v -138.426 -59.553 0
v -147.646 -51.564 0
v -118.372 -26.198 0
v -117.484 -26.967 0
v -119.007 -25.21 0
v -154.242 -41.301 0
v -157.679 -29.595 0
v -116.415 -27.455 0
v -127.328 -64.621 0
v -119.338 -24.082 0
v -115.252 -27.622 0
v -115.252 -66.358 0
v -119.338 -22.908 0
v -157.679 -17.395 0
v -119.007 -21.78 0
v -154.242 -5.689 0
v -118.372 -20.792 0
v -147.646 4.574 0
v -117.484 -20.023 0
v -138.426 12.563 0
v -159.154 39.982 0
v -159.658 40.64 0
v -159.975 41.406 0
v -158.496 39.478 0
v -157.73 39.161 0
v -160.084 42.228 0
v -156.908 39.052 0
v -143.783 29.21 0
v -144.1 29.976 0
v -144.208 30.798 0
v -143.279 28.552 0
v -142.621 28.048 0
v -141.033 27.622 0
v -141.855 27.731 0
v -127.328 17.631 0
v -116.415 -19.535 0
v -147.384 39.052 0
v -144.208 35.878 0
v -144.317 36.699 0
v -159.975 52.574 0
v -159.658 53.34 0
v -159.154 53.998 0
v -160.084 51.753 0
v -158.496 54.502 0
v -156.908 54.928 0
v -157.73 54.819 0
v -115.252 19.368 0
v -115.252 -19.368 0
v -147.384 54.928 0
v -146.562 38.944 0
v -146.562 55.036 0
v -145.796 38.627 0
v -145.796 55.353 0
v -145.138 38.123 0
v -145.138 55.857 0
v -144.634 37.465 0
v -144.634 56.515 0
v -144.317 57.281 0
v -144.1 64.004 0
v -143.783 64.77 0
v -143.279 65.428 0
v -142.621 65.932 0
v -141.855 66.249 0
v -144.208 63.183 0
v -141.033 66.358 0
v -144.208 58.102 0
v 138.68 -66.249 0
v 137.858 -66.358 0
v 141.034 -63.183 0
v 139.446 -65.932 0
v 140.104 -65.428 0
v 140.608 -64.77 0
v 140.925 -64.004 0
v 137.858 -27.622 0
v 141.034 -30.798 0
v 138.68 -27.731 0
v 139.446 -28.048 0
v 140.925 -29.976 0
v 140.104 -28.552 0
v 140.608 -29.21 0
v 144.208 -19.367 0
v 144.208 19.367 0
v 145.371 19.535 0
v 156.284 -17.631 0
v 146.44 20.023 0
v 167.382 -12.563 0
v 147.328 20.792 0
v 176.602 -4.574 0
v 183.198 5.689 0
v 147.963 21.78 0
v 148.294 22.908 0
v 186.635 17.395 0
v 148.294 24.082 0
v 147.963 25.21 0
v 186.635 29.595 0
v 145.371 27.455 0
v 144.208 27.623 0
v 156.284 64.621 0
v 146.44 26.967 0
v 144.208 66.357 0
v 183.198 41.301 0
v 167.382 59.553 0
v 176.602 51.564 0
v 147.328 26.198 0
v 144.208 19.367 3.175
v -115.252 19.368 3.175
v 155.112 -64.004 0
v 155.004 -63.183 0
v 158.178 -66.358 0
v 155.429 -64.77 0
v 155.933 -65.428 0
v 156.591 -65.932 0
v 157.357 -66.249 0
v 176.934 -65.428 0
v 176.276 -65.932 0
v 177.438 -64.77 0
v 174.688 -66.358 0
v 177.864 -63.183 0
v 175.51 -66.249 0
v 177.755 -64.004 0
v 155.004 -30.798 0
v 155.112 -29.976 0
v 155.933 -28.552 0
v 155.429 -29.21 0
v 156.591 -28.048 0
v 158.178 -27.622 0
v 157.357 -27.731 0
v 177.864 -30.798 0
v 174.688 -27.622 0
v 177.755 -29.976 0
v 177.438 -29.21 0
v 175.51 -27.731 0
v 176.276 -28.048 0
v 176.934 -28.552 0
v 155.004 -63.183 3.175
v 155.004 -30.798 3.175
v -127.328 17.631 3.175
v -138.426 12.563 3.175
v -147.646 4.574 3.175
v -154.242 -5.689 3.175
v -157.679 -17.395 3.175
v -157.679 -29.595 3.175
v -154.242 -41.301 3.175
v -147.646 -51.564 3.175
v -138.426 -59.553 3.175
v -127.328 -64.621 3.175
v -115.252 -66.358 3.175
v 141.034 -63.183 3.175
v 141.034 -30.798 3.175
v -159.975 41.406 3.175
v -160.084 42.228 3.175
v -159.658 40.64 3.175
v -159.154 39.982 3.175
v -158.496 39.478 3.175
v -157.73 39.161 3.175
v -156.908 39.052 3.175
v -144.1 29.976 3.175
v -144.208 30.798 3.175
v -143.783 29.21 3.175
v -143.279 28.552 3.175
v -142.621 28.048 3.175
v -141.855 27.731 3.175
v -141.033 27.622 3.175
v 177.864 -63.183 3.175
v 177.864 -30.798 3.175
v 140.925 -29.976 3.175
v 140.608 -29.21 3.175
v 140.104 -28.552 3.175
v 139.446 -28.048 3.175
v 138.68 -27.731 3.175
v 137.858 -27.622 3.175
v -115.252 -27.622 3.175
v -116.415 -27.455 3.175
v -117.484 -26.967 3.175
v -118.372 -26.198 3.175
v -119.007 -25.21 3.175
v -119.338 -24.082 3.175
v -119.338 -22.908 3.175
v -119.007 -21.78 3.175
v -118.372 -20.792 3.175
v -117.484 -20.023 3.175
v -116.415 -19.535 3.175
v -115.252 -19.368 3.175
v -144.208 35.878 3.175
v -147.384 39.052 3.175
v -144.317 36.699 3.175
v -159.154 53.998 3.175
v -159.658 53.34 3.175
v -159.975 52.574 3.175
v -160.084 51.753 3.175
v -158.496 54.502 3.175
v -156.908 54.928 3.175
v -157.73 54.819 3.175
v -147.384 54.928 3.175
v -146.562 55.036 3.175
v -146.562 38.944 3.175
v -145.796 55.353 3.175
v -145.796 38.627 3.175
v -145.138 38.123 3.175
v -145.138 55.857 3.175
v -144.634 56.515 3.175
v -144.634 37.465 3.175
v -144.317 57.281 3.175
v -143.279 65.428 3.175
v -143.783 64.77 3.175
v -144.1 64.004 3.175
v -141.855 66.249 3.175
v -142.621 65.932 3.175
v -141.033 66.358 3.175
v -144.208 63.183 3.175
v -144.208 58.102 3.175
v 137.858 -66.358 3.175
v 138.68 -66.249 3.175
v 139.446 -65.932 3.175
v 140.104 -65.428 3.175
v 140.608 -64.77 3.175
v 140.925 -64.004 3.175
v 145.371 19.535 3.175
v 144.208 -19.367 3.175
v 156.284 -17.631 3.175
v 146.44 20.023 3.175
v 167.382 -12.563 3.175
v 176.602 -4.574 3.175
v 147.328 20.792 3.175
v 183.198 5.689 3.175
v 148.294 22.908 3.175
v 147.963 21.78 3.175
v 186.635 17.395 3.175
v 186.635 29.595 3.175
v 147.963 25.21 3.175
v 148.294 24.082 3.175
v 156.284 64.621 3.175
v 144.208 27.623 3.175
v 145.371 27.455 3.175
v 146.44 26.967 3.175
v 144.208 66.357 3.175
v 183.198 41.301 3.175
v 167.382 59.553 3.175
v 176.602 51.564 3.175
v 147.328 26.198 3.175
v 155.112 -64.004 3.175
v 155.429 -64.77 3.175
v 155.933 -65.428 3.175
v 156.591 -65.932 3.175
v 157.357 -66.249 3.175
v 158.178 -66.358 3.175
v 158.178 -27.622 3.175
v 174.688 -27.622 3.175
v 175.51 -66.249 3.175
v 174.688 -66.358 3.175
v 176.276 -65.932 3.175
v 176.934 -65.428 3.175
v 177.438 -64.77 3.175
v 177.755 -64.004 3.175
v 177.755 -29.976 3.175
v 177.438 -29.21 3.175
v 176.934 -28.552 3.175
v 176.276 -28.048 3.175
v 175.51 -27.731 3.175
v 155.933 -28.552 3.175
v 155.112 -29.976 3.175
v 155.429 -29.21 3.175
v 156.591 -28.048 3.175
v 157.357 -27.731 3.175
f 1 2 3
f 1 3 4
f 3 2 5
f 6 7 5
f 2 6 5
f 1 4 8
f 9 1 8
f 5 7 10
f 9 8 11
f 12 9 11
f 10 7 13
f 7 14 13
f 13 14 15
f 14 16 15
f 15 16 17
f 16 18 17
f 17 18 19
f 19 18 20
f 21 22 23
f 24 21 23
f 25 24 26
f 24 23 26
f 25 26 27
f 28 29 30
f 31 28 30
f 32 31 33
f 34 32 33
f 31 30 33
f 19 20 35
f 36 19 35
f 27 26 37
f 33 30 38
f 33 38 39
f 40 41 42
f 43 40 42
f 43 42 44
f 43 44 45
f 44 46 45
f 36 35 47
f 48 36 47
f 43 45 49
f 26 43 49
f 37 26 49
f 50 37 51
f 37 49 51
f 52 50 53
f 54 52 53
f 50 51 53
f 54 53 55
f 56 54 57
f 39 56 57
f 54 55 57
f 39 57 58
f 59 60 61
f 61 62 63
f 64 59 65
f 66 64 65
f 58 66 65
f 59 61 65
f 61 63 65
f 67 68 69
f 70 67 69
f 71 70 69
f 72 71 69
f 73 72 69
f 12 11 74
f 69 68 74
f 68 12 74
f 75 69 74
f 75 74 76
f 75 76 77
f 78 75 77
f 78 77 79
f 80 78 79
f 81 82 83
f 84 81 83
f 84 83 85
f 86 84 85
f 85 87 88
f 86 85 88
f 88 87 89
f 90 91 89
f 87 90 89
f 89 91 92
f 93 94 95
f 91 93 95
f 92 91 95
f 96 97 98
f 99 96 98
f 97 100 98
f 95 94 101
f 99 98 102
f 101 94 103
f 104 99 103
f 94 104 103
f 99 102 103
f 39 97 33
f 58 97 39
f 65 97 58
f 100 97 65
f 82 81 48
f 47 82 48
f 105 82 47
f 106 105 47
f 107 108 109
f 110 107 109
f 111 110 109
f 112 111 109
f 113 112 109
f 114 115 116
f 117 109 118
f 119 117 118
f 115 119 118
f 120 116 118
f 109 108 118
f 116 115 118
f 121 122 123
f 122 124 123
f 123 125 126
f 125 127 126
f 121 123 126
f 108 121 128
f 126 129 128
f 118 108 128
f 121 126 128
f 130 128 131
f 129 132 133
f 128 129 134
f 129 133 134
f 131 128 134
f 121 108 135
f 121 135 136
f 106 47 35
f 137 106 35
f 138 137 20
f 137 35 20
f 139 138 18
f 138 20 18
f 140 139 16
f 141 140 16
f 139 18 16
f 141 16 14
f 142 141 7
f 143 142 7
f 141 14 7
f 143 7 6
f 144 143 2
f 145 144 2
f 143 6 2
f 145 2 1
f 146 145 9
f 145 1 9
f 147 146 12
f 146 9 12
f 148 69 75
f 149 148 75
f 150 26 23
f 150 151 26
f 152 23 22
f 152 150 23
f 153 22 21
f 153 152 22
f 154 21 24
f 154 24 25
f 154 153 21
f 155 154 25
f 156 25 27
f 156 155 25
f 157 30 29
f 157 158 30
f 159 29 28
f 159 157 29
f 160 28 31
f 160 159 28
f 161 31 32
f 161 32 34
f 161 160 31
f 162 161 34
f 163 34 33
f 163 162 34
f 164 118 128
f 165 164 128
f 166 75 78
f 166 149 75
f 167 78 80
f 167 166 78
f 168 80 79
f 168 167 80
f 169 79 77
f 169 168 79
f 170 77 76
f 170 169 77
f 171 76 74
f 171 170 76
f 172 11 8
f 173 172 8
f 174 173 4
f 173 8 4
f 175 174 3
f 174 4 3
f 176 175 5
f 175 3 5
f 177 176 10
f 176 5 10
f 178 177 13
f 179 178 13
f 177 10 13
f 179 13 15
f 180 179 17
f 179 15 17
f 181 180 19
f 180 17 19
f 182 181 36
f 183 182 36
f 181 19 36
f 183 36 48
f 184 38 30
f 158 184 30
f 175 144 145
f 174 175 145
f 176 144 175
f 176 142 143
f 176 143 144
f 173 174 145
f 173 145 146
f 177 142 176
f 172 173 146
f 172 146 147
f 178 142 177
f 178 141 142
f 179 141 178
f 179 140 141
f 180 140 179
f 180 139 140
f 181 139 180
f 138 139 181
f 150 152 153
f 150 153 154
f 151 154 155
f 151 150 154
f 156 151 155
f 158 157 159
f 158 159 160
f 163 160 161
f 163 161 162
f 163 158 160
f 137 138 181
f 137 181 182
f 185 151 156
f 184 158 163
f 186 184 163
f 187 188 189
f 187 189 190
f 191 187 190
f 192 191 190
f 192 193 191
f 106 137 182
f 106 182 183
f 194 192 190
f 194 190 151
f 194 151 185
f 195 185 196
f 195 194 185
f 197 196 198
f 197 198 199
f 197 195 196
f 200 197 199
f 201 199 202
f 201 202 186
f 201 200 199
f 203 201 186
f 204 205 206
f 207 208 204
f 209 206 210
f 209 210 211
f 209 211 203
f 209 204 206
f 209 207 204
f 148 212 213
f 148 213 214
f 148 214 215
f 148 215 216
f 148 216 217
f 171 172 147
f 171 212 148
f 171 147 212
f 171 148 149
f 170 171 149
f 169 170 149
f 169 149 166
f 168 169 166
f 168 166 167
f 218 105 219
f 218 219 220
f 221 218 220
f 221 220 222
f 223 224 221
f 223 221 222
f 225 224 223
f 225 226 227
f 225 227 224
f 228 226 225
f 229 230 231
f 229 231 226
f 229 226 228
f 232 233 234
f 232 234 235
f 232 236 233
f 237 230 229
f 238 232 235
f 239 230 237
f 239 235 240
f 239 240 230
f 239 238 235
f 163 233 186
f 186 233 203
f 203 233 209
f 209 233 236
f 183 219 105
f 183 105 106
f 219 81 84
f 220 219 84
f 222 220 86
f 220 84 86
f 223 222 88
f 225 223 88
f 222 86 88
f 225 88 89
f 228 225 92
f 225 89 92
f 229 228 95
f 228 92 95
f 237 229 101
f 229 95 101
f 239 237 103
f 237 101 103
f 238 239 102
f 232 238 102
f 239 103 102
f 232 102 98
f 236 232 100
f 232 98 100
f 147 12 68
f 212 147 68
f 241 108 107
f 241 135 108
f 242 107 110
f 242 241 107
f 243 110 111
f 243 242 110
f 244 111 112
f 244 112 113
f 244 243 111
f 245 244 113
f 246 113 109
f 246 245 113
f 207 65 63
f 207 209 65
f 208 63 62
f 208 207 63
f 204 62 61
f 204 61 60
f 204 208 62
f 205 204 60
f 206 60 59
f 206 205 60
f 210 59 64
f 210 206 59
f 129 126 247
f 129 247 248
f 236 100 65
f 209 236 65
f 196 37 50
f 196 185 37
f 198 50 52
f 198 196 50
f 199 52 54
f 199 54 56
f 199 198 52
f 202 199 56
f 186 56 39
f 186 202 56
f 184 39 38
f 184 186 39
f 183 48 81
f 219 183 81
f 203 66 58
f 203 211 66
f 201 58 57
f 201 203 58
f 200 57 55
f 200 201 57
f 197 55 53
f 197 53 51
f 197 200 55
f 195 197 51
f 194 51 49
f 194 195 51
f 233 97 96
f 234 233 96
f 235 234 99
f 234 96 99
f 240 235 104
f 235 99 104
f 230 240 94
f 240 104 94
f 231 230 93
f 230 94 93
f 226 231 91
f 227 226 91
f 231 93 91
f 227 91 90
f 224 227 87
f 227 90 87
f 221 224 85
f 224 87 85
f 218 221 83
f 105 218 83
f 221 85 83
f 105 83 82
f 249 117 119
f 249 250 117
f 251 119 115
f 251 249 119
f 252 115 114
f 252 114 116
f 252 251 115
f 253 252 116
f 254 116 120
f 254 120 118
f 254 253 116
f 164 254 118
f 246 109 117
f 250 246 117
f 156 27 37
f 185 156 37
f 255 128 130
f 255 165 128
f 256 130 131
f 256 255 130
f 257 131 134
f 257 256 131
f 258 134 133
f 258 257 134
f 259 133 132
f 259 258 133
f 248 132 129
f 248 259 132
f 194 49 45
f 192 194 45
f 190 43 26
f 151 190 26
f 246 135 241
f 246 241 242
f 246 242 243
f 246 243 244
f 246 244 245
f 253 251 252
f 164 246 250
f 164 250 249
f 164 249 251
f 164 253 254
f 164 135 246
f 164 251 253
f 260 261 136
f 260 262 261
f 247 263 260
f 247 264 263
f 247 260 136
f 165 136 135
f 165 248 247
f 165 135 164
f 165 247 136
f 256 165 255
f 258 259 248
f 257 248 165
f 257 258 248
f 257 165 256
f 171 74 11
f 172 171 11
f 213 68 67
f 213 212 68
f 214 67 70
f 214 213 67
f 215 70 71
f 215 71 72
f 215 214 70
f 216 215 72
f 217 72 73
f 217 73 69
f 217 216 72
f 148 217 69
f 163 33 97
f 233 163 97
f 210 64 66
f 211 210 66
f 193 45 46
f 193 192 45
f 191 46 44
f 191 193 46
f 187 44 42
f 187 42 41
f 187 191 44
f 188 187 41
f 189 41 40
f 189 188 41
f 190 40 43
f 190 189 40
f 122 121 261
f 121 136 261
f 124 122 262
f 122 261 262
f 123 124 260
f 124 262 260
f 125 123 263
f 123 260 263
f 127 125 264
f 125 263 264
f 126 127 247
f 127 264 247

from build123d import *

# Parameters (mm, degrees)
F0_W     = 22.86
F0_H     = 38.735
F1_DEPTH = 3.175
F2_R     = 3.175


with BuildPart() as f1:
    # F0 (on Top) → F1 (new body)
    with BuildSketch(Plane.XY):
        with BuildLine():
            ThreePointArc((144.2085, -19.3675), (187.071, 23.495), (144.2085, 66.3575))
            Line((144.2085, 66.3575), (-144.2085, 66.3575))
            Line((-144.2085, 66.3575), (-144.2085, 54.9275))
            Line((-144.2085, 54.9275), (-160.0835, 54.9275))
            Line((-160.0835, 54.9275), (-160.0835, 39.0525))
            Line((-160.0835, 39.0525), (-144.2085, 39.0525))
            Line((-144.2085, 39.0525), (-144.2085, 27.6225))
            Line((-144.2085, 27.6225), (144.2085, 27.6225))
            ThreePointArc((144.2085, 27.6225), (148.336, 23.495), (144.2085, 19.3675))
            Line((144.2085, 19.3675), (-115.2525, 19.3675))
            ThreePointArc((-115.2525, 19.3675), (-158.115, -23.495), (-115.2525, -66.3575))
            Line((-115.2525, -66.3575), (141.0335, -66.3575))
            Line((141.0335, -66.3575), (141.0335, -27.6225))
            Line((141.0335, -27.6225), (-115.2525, -27.6225))
            ThreePointArc((-115.2525, -27.6225), (-119.38, -23.495), (-115.2525, -19.3675))
            Line((-115.2525, -19.3675), (144.2085, -19.3675))
        make_face()
        with Locations((166.4335, -46.99)):
            Rectangle(F0_W, F0_H)
    extrude(amount=F1_DEPTH)

    # F2
    f2_edges = [f1.edges().sort_by_distance(p)[0] for p in [
        (141.0335, -27.6225, 1.5875),
        (177.8635, -27.6225, 1.5875),
        (141.0335, -66.3575, 1.5875),
        (155.0035, -66.3575, 1.5875),
        (177.8635, -66.3575, 1.5875),
        (155.0035, -27.6225, 1.5875),
        (-144.2085, 66.3575, 1.5875),
        (-144.2085, 54.9275, 1.5875),
        (-160.0835, 54.9275, 1.5875),
        (-160.0835, 39.0525, 1.5875),
        (-144.2085, 27.6225, 1.5875),
        (-144.2085, 39.0525, 1.5875),
    ]]
    fillet(f2_edges, radius=F2_R)


solid = f1.part
